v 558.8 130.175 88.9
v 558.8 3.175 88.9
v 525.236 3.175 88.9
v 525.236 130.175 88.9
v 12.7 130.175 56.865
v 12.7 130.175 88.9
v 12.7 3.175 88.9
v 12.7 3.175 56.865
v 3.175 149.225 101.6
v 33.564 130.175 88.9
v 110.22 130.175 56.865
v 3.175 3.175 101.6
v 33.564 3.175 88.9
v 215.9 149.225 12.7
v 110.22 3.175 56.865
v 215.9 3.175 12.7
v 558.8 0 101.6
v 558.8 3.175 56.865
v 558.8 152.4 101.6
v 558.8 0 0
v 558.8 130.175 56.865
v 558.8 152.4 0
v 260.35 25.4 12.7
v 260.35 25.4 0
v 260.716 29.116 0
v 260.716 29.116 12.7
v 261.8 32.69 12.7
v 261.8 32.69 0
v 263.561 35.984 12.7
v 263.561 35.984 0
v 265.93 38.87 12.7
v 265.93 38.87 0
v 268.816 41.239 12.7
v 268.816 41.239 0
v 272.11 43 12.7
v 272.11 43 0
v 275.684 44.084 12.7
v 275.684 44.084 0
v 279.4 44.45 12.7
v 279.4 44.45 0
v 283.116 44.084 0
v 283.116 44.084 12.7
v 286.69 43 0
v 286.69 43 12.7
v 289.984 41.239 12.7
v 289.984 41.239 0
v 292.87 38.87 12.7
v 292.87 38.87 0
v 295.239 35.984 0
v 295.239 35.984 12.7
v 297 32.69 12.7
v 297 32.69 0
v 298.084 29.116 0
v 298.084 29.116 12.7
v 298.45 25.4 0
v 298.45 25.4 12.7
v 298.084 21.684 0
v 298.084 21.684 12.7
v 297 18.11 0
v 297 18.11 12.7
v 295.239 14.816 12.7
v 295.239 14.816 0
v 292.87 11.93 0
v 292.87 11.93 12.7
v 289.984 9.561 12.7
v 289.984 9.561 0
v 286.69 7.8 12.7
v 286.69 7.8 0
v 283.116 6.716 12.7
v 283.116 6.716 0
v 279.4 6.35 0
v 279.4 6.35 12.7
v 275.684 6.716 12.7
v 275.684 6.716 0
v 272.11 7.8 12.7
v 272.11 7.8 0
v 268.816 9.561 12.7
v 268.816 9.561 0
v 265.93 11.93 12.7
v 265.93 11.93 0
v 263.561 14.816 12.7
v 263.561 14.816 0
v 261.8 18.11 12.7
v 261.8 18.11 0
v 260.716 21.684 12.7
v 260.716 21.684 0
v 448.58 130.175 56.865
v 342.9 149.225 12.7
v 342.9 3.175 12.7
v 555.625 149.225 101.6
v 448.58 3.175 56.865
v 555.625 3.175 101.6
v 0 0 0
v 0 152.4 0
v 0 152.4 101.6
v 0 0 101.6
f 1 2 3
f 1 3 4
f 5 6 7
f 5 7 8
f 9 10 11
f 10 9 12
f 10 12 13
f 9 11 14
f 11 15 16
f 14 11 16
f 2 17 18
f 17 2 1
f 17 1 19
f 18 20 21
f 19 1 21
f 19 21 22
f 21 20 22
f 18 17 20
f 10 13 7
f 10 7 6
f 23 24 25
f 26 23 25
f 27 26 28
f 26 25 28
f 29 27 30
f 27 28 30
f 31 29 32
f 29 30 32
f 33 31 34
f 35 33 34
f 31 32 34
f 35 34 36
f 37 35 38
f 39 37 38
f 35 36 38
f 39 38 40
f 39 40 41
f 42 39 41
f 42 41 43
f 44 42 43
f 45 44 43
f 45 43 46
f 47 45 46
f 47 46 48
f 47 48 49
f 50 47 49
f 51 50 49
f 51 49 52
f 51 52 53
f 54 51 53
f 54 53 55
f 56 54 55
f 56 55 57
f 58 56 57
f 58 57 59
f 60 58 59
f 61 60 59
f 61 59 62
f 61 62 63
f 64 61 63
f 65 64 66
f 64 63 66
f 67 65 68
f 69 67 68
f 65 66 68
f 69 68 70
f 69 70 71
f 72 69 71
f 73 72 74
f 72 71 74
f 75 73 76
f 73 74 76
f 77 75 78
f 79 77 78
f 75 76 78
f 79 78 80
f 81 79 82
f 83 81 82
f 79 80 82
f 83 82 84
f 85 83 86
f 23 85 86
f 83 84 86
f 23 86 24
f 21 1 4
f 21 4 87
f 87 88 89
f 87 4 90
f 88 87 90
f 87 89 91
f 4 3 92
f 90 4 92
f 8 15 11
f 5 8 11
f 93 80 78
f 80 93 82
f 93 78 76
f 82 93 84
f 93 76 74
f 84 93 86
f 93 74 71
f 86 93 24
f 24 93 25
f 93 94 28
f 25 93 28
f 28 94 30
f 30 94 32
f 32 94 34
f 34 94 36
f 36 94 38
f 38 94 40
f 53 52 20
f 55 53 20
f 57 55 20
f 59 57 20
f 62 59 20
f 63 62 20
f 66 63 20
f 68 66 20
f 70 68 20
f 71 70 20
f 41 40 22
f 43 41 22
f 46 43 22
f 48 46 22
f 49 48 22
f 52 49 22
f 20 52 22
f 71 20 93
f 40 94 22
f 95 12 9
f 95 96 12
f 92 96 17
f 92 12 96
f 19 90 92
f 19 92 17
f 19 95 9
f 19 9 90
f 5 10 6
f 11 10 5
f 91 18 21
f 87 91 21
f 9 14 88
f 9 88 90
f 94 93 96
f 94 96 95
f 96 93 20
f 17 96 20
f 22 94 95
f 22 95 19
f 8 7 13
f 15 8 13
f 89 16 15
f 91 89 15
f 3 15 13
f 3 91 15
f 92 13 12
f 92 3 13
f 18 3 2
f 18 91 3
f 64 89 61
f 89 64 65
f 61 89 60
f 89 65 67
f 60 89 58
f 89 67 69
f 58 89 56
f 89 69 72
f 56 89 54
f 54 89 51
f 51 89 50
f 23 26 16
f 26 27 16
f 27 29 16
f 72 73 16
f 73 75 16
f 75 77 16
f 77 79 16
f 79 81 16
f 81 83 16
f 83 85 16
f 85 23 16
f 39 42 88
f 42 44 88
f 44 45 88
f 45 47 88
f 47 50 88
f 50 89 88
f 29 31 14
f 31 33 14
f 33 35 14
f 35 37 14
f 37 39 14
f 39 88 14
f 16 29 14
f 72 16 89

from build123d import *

# Parameters (mm, degrees)
SKETCH1_W            = 558.8
SKETCH1_H            = 152.4
SKETCH1_W_2          = 552.45
SKETCH1_H_2          = 146.05
BOSS_EXTRUDE2_DEPTH  = 101.6
BOSS_EXTRUDE3_REACH  = 151.225
SKETCH5_W            = 552.45
SKETCH5_H            = 146.05
BOSS_EXTRUDE15_DEPTH = 12.7
SKETCH8_R            = 19.05
CUT_EXTRUDE1_DEPTH   = 102.6
SKETCH9_W            = 32.035224234
SKETCH9_H            = 127
CUT_EXTRUDE2_DEPTH   = 546.1


with BuildPart() as part:
    # Sketch1 → Boss-Extrude2 (new body)
    with BuildSketch(Plane.XY):
        with Locations((279.4, 76.2)):
            Rectangle(SKETCH1_W, SKETCH1_H)
        with Locations((279.4, 76.2)):
            Rectangle(SKETCH1_W_2, SKETCH1_H_2, mode=Mode.SUBTRACT)
    extrude(amount=BOSS_EXTRUDE2_DEPTH)

    # Sketch2 → Boss-Extrude3 (add, up to next)
    with BuildSketch(Plane(origin=(0, 3.175, 0), x_dir=(1, 0, 0), z_dir=(0, 1, 0)), mode=Mode.PRIVATE) as boss_extrude3_sk1:
        Polygon((3.175, -101.6), (215.9, -12.7), (3.175, -12.7), align=None)
    boss_extrude3_tool1 = extrude(boss_extrude3_sk1.sketch, amount=BOSS_EXTRUDE3_REACH, mode=Mode.PRIVATE) - part.part
    add(boss_extrude3_tool1.solids().sort_by_distance((74.083333, 3.175, 42.333333))[0])
    # Sketch2 → Boss-Extrude3 (add, up to next)
    with BuildSketch(Plane(origin=(0, 3.175, 0), x_dir=(1, 0, 0), z_dir=(0, 1, 0)), mode=Mode.PRIVATE) as boss_extrude3_sk2:
        Polygon((342.9, -12.7), (555.625, -101.6), (555.625, -12.7), align=None)
    boss_extrude3_tool2 = extrude(boss_extrude3_sk2.sketch, amount=BOSS_EXTRUDE3_REACH, mode=Mode.PRIVATE) - part.part
    add(boss_extrude3_tool2.solids().sort_by_distance((484.716667, 3.175, 42.333333))[0])

    # Sketch5 → Boss-Extrude15 (add)
    with BuildSketch(Plane(origin=(0, 0, 12.7), x_dir=(-1, 0, 0), z_dir=(0, 0, -1))):
        with Locations((-279.4, 76.2)):
            Rectangle(SKETCH5_W, SKETCH5_H)
    extrude(amount=BOSS_EXTRUDE15_DEPTH)

    # Sketch8 → Cut-Extrude1 (cut, through all)
    with BuildSketch(Plane(origin=(0, 0, 0), x_dir=(-1, 0, 0), z_dir=(0, 0, -1))):
        with Locations((-279.4, 25.4)):
            Circle(SKETCH8_R)
    extrude(amount=-CUT_EXTRUDE1_DEPTH, mode=Mode.SUBTRACT)

    # Sketch9 → Cut-Extrude2 (cut)
    with BuildSketch(Plane(origin=(558.8, 0, 0), x_dir=(0, 0, -1), z_dir=(1, 0, 0))):
        with Locations((-72.882387883, 66.675)):
            Rectangle(SKETCH9_W, SKETCH9_H)
    extrude(amount=-CUT_EXTRUDE2_DEPTH, mode=Mode.SUBTRACT)


solid = part.part
